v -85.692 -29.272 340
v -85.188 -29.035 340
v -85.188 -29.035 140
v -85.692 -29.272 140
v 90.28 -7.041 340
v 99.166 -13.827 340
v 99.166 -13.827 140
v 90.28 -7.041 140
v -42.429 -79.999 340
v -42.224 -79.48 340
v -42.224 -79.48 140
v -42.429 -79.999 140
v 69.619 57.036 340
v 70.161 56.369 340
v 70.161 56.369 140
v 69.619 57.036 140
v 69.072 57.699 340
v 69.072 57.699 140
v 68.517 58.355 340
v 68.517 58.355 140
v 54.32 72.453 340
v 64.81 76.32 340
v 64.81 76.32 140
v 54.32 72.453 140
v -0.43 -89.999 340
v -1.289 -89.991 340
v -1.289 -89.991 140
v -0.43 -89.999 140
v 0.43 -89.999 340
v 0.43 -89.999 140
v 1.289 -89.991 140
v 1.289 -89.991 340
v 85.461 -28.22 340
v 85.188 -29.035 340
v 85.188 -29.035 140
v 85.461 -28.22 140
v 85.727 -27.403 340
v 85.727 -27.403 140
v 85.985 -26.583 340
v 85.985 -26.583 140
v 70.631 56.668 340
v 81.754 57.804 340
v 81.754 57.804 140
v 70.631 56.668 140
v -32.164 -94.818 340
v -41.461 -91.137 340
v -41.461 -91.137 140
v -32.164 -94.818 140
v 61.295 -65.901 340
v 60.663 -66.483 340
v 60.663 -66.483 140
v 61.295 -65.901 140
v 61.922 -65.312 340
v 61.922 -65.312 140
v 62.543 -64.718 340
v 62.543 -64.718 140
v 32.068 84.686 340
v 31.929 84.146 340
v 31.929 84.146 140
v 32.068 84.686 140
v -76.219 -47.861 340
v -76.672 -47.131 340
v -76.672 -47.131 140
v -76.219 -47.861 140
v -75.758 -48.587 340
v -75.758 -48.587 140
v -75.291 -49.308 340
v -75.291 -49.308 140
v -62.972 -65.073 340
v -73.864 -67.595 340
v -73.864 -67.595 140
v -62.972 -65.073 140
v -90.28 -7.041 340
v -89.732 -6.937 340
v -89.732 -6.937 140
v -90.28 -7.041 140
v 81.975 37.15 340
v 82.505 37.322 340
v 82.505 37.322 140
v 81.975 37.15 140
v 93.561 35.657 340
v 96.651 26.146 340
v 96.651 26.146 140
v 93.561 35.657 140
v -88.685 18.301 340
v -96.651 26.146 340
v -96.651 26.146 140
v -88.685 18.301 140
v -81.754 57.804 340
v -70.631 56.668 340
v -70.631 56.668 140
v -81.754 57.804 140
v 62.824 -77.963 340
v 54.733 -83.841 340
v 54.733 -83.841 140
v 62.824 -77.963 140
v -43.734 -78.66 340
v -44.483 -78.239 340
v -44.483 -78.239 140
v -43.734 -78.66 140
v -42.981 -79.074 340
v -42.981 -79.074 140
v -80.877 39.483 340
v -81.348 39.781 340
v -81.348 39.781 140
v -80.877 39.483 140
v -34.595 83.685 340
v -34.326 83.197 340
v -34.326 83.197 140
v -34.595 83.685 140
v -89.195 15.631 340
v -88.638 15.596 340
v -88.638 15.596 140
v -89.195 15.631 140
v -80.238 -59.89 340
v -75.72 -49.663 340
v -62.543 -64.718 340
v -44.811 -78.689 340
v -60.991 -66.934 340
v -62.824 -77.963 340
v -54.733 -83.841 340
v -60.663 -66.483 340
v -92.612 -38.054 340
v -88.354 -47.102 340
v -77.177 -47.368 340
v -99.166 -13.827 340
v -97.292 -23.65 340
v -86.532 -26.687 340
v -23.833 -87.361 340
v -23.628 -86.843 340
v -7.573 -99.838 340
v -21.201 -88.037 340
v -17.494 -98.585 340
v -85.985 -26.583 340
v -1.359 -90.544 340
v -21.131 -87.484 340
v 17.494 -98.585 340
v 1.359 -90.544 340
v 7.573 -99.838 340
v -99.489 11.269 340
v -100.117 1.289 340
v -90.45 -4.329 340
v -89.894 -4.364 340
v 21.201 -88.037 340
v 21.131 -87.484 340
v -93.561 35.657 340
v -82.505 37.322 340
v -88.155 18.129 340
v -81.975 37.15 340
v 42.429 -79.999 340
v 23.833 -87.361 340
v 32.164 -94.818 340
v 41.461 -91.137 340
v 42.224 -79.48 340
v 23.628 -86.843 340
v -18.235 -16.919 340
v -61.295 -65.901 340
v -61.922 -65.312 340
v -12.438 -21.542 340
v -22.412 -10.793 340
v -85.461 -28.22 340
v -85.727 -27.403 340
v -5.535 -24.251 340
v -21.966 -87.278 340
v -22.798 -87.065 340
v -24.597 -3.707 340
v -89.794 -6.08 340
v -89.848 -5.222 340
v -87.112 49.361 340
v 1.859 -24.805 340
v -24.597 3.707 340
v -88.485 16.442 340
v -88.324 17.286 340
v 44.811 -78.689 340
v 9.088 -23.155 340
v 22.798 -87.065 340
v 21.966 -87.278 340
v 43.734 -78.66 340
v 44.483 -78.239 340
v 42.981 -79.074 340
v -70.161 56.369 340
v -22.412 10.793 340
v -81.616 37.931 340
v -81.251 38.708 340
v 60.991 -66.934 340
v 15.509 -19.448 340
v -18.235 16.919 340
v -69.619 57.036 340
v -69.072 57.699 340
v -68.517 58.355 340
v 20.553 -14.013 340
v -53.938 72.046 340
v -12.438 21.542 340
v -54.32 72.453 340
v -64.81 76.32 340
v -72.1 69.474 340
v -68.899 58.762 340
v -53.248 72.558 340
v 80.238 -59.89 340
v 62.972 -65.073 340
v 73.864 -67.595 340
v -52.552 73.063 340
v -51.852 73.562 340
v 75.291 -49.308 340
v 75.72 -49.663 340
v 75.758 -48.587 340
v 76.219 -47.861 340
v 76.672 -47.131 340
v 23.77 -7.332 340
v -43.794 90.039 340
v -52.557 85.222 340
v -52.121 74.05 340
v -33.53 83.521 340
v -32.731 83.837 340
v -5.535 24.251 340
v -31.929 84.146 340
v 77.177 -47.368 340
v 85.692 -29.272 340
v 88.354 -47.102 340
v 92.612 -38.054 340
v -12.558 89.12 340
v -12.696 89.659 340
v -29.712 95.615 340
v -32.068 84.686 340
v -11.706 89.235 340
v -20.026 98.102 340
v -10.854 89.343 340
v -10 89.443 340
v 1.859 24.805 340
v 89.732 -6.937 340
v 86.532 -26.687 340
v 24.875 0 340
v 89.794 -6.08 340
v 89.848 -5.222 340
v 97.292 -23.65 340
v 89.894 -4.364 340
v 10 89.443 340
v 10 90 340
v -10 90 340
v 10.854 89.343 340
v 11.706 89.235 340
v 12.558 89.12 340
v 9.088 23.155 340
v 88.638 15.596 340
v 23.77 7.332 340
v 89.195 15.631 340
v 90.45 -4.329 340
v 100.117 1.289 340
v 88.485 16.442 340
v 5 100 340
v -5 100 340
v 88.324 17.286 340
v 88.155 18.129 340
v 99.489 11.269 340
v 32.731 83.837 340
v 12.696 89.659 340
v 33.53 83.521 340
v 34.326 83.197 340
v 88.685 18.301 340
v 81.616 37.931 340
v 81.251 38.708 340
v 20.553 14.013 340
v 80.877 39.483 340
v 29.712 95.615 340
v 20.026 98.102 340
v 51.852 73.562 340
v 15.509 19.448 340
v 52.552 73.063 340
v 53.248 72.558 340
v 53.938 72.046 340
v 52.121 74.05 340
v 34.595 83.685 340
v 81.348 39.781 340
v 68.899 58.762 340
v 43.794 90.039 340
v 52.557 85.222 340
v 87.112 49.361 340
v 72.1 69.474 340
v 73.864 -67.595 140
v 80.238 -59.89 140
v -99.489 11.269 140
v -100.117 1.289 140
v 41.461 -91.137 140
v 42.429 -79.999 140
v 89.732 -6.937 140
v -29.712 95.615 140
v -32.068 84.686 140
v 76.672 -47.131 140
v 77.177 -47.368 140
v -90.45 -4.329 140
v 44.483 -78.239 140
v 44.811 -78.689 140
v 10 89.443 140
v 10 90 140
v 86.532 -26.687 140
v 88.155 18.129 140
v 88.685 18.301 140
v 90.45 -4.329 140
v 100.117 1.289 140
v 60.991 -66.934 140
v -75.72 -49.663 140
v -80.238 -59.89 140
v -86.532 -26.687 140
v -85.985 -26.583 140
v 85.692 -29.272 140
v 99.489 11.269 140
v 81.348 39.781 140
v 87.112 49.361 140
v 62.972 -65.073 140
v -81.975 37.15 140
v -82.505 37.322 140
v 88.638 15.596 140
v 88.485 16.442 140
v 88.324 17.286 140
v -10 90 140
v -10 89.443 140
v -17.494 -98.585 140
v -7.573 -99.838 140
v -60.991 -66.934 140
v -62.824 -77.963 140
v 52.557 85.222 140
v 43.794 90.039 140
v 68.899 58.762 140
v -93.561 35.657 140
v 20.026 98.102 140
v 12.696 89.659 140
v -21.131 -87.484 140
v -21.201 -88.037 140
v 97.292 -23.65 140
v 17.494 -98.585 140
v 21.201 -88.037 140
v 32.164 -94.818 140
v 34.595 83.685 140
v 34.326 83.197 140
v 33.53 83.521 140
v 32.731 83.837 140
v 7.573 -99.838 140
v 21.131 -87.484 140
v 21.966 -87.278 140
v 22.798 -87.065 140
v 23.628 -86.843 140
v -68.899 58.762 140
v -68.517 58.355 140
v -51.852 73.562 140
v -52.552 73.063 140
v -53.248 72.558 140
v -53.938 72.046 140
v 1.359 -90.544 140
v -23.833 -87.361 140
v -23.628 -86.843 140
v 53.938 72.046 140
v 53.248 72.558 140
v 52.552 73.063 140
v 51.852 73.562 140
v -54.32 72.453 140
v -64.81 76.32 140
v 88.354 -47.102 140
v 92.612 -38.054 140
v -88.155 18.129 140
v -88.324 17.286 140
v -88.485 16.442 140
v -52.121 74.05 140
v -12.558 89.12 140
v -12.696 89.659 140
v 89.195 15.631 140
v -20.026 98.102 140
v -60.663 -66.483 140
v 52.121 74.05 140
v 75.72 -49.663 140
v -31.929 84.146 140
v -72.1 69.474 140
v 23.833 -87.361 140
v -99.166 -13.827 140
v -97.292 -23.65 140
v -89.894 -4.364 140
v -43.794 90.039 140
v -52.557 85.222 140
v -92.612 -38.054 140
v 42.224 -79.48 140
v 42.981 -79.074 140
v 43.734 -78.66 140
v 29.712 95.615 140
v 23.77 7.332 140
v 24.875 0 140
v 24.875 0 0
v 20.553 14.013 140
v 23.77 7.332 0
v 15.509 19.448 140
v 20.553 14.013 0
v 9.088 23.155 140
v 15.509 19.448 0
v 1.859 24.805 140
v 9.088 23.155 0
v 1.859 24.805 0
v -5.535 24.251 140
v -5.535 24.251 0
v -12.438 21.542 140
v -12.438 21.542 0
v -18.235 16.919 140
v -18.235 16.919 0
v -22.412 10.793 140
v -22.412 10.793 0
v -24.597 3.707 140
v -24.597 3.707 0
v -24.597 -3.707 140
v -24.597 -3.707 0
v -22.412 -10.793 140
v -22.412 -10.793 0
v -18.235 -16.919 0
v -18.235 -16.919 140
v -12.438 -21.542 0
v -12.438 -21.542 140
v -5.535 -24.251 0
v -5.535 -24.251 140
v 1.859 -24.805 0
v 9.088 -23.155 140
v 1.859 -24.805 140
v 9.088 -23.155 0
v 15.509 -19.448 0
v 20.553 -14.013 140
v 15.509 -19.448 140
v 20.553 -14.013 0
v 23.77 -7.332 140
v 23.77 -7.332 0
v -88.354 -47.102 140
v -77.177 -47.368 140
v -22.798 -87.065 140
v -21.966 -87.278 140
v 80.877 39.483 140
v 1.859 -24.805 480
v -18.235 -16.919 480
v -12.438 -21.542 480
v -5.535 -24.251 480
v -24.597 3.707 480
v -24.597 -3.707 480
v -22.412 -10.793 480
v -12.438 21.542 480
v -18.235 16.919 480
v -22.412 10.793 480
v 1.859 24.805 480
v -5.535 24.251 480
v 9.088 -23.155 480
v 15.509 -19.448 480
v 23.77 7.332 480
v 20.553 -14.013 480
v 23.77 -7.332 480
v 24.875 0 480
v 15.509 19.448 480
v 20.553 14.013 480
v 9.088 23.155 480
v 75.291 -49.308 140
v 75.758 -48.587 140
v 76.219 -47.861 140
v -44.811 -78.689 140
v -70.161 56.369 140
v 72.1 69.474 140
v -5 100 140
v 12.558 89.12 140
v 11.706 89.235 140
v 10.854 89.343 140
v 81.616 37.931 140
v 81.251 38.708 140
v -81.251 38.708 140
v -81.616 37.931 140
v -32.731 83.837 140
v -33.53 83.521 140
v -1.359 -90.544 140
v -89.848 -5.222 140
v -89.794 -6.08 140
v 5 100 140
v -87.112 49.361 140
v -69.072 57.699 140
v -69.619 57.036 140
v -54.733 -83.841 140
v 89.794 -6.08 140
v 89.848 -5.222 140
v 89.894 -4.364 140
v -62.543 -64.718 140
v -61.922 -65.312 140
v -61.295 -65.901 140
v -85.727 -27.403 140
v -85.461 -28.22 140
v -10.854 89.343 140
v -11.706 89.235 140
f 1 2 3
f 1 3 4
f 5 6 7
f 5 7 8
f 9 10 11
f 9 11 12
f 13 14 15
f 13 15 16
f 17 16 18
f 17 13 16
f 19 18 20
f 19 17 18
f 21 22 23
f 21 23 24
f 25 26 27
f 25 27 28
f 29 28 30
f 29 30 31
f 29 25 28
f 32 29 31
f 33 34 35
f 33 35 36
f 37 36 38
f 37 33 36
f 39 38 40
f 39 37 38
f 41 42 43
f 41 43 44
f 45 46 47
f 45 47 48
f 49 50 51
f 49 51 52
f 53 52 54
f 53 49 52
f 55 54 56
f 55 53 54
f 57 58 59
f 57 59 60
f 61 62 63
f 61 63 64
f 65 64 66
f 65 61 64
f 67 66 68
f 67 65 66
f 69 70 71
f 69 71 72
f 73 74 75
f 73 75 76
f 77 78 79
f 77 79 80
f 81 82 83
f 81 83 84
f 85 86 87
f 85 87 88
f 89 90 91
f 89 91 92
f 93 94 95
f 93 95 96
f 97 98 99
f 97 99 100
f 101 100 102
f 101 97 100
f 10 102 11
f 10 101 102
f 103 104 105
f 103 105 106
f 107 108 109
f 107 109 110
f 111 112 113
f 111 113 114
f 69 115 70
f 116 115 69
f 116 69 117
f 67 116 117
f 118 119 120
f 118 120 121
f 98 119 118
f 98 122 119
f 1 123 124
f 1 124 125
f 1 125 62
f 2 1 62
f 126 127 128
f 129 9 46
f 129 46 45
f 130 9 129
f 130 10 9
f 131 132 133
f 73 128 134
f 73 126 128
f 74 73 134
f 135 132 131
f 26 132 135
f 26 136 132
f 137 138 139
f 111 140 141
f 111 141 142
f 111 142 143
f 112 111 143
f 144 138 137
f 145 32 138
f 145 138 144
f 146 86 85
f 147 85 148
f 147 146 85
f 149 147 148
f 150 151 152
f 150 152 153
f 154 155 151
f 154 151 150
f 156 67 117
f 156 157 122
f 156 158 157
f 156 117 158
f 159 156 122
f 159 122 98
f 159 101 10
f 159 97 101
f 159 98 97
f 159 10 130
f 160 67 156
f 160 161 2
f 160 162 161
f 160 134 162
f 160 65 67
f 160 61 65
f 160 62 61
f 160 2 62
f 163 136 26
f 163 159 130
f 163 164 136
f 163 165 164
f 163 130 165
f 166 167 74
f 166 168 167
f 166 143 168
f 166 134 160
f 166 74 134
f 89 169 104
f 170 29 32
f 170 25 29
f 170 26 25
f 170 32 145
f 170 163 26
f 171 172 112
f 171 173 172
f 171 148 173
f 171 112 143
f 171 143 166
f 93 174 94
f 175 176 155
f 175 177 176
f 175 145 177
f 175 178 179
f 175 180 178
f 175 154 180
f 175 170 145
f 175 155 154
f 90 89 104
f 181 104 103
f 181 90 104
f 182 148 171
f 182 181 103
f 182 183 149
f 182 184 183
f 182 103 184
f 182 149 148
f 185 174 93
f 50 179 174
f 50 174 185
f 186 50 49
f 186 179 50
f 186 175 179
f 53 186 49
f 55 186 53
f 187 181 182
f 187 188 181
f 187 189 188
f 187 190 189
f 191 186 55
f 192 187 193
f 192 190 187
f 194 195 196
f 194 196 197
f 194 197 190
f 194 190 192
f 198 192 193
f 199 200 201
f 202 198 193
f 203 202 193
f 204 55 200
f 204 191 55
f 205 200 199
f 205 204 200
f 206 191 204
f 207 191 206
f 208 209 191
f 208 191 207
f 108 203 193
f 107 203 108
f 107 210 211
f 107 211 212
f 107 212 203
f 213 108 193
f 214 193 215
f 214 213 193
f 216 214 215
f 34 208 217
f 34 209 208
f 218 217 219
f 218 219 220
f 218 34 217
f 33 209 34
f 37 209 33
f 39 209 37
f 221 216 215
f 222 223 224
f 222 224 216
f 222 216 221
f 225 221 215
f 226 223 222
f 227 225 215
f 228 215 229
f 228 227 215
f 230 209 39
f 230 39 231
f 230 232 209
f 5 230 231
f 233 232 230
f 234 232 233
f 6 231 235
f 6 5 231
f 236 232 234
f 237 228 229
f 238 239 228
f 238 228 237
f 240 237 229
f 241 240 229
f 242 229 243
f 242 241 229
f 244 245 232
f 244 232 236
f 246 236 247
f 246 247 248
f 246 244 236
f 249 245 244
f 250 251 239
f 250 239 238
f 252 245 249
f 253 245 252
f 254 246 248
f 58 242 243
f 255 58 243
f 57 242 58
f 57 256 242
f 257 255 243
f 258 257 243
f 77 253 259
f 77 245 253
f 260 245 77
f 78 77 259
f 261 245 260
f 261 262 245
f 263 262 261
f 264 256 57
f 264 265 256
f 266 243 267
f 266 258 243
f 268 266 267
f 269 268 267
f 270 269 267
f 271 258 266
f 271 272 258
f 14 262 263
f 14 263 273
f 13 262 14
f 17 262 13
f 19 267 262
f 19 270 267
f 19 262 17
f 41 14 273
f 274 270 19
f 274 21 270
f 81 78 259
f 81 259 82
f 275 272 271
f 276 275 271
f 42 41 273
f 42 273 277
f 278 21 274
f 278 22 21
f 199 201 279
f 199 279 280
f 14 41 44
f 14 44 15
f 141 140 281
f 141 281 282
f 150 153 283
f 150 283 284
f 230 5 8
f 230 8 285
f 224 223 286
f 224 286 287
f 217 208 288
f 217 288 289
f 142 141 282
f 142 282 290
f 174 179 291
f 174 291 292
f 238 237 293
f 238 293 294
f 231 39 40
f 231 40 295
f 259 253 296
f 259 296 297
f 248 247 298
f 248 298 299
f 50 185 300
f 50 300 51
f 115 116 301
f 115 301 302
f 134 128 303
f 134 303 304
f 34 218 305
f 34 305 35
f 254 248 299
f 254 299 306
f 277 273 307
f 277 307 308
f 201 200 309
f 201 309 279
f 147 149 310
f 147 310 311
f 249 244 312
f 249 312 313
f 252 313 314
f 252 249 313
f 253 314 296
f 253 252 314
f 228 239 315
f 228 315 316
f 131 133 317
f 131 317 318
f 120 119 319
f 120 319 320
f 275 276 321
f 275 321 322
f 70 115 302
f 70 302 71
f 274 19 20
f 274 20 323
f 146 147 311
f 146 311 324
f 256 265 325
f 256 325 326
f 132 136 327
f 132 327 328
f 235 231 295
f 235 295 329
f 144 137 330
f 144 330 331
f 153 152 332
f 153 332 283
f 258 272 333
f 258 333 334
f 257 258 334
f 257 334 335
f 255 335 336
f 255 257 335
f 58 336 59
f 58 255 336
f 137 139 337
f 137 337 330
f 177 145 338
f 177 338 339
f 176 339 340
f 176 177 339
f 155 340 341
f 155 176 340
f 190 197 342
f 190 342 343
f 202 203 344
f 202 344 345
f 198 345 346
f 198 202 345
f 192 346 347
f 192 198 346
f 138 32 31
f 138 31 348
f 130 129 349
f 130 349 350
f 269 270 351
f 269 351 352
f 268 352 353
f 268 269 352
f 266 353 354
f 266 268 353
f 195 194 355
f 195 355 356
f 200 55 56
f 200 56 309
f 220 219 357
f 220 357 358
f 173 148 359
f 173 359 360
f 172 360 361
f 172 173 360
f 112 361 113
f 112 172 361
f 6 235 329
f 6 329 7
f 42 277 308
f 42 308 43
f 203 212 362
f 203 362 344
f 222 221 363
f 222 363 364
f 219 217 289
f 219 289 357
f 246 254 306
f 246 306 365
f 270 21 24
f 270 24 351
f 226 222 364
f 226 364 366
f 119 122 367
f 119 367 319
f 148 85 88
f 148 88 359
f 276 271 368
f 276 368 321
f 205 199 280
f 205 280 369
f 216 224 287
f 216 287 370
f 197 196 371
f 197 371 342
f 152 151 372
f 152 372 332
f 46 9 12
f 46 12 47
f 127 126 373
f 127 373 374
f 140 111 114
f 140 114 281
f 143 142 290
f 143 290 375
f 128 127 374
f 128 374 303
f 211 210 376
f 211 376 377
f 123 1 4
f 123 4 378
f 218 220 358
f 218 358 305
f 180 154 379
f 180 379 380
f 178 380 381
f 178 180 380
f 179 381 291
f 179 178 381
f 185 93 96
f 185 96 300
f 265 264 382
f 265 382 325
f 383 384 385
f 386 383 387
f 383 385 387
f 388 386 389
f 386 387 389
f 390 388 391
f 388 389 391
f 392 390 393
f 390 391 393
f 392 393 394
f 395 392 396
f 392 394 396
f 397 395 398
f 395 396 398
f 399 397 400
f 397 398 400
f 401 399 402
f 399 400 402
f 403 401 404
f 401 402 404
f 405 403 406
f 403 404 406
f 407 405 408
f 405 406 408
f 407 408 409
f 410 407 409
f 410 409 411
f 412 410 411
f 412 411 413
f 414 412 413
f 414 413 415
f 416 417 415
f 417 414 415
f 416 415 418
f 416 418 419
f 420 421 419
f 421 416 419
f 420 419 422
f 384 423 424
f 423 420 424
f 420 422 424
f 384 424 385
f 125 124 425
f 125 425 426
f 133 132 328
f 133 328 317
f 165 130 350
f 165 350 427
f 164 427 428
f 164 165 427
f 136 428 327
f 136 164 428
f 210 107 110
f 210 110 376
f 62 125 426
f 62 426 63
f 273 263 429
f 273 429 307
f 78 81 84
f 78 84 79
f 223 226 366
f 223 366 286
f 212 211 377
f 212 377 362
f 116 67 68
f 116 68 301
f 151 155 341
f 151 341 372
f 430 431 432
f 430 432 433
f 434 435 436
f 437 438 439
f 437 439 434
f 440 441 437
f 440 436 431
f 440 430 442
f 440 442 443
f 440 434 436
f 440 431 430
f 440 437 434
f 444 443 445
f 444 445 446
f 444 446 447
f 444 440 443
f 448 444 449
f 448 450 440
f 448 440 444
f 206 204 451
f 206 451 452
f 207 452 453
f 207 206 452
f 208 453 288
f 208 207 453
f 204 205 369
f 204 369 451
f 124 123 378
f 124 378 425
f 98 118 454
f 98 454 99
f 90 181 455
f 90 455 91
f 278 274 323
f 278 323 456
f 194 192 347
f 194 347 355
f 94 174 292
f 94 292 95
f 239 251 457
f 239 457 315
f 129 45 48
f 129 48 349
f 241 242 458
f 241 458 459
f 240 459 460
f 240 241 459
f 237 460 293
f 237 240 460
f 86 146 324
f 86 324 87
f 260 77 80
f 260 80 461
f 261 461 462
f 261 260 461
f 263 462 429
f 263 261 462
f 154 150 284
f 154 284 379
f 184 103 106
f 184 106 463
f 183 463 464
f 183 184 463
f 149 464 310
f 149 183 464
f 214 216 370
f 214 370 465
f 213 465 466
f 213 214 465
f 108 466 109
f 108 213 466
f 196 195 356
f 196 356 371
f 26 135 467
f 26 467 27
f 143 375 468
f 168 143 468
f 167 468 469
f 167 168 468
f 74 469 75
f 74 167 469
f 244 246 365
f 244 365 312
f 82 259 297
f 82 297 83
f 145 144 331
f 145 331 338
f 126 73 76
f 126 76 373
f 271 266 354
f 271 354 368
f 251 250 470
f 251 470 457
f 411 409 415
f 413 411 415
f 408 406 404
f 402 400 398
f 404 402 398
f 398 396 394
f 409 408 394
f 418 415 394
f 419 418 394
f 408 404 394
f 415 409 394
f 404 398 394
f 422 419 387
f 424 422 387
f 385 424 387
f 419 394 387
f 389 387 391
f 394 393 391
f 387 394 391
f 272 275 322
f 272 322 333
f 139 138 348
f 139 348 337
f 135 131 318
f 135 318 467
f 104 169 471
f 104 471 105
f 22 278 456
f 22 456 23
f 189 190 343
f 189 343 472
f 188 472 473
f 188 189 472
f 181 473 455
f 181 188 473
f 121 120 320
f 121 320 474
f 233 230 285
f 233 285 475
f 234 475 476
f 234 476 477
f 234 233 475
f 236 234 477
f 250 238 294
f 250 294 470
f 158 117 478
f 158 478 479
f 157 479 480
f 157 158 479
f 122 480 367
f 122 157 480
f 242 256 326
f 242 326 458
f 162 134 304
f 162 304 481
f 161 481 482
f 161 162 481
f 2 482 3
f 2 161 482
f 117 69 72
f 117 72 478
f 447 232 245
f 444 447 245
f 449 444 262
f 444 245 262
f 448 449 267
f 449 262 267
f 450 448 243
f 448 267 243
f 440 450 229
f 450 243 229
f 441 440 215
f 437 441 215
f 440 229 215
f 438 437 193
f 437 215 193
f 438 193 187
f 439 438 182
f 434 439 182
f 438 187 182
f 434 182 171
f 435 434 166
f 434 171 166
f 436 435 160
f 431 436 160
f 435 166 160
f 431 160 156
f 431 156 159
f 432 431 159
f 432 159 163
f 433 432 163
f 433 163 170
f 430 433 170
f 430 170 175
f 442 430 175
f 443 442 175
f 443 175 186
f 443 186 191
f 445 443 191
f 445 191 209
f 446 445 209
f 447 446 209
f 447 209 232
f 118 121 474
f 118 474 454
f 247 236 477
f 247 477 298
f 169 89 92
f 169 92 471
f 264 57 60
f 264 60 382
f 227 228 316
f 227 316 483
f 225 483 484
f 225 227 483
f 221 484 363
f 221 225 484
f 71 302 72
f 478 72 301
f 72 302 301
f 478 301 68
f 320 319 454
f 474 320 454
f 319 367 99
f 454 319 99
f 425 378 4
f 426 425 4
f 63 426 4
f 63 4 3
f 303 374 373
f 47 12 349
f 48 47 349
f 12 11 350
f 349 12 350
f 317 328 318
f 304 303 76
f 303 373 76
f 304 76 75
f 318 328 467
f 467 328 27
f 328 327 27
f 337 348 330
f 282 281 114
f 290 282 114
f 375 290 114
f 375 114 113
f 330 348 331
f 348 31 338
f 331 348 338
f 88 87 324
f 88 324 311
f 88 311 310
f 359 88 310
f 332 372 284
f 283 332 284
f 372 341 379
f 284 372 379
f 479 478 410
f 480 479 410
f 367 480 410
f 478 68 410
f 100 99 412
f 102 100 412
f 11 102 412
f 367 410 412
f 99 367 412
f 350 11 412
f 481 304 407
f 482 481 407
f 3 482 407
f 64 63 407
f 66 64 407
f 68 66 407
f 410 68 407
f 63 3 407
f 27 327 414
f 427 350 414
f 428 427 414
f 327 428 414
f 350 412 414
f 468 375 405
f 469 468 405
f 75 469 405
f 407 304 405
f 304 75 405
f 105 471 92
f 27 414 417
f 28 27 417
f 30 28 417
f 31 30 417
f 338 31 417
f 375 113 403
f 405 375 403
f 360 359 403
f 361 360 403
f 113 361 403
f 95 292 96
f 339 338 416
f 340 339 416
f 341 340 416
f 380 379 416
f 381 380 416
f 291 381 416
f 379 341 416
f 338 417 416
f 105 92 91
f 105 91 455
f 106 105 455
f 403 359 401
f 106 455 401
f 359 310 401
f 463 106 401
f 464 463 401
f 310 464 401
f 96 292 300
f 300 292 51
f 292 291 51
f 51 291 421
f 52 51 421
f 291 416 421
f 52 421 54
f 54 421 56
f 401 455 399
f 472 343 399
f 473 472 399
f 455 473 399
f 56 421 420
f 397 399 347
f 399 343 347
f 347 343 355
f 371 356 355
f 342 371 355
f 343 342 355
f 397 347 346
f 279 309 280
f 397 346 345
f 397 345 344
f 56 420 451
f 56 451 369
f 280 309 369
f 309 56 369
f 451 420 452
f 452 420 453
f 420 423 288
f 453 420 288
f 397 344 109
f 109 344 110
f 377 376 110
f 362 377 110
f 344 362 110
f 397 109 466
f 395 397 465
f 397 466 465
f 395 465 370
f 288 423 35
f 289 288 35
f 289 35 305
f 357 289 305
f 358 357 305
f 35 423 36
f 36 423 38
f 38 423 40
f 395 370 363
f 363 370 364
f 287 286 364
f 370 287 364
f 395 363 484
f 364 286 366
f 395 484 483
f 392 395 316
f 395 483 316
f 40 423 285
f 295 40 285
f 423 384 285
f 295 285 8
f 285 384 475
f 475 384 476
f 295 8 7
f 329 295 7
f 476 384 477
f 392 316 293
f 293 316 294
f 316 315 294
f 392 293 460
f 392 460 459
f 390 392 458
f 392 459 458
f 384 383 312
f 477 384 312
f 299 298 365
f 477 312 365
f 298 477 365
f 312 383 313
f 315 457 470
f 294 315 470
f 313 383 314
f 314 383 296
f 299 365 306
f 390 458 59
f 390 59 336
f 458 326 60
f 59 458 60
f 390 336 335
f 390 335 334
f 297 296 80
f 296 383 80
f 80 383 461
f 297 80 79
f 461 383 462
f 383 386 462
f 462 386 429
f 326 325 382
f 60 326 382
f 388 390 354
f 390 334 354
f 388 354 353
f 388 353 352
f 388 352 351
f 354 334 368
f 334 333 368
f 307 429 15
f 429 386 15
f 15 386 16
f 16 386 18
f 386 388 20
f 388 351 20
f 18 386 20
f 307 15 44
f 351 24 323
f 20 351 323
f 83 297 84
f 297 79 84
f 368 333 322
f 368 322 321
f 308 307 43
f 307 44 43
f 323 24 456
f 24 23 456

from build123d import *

# Parameters (mm, degrees)
SKETCH1_R           = 24.875
BOSS_EXTRUDE1_DEPTH = 480
SKETCH2_R           = 90
BOSS_EXTRUDE2_DEPTH = 100
BOSS_EXTRUDE3_DEPTH = 200
CIRPATTERN1_COUNT   = 25


with BuildPart() as part:
    # Sketch1 → Boss-Extrude1 (new body)
    with BuildSketch(Plane.XY):
        Circle(SKETCH1_R)
    extrude(amount=BOSS_EXTRUDE1_DEPTH)

    # Sketch2 → Boss-Extrude2 (add, symmetric)
    with BuildSketch(Plane.XY.offset(240)):
        Circle(SKETCH2_R)
    extrude(amount=BOSS_EXTRUDE2_DEPTH, both=True)

    # Sketch3 → Boss-Extrude3 (add)
    with BuildSketch(Plane.XY.offset(340)):
        with BuildLine():
            ThreePointArc((10, 89.4427191), (0, 90), (-10, 89.4427191))
            Line((-10, 89.4427191), (-10, 80))
            Line((-10, 80), (10, 80))
            Line((10, 80), (10, 89.4427191))
        make_face()
        with BuildLine():
            Line((-10, 80), (-10, 89.4427191))
            ThreePointArc((-10, 89.4427191), (-60, -67.082039325), (90, 0))
            ThreePointArc((90, 0), (67.082039325, 60), (10, 89.4427191))
            Line((10, 89.4427191), (10, 80))
            Line((10, 80), (-10, 80))
        make_face()
        with BuildLine():
            Line((-5, 100), (-10, 90))
            Line((-10, 90), (-10, 89.4427191))
            ThreePointArc((-10, 89.4427191), (0, 90), (10, 89.4427191))
            Line((10, 89.4427191), (10, 90))
            Line((10, 90), (5, 100))
            Line((5, 100), (-5, 100))
        make_face()
    boss_extrude3 = extrude(amount=-BOSS_EXTRUDE3_DEPTH)

    # CirPattern1: Boss-Extrude3 ×25 about axis
    cirpattern1_axis = Axis((0, 0, 0), (0, 0, 1))
    for i in range(1, CIRPATTERN1_COUNT):
        add(boss_extrude3.rotate(cirpattern1_axis, i * 360 / CIRPATTERN1_COUNT))


solid = part.part
